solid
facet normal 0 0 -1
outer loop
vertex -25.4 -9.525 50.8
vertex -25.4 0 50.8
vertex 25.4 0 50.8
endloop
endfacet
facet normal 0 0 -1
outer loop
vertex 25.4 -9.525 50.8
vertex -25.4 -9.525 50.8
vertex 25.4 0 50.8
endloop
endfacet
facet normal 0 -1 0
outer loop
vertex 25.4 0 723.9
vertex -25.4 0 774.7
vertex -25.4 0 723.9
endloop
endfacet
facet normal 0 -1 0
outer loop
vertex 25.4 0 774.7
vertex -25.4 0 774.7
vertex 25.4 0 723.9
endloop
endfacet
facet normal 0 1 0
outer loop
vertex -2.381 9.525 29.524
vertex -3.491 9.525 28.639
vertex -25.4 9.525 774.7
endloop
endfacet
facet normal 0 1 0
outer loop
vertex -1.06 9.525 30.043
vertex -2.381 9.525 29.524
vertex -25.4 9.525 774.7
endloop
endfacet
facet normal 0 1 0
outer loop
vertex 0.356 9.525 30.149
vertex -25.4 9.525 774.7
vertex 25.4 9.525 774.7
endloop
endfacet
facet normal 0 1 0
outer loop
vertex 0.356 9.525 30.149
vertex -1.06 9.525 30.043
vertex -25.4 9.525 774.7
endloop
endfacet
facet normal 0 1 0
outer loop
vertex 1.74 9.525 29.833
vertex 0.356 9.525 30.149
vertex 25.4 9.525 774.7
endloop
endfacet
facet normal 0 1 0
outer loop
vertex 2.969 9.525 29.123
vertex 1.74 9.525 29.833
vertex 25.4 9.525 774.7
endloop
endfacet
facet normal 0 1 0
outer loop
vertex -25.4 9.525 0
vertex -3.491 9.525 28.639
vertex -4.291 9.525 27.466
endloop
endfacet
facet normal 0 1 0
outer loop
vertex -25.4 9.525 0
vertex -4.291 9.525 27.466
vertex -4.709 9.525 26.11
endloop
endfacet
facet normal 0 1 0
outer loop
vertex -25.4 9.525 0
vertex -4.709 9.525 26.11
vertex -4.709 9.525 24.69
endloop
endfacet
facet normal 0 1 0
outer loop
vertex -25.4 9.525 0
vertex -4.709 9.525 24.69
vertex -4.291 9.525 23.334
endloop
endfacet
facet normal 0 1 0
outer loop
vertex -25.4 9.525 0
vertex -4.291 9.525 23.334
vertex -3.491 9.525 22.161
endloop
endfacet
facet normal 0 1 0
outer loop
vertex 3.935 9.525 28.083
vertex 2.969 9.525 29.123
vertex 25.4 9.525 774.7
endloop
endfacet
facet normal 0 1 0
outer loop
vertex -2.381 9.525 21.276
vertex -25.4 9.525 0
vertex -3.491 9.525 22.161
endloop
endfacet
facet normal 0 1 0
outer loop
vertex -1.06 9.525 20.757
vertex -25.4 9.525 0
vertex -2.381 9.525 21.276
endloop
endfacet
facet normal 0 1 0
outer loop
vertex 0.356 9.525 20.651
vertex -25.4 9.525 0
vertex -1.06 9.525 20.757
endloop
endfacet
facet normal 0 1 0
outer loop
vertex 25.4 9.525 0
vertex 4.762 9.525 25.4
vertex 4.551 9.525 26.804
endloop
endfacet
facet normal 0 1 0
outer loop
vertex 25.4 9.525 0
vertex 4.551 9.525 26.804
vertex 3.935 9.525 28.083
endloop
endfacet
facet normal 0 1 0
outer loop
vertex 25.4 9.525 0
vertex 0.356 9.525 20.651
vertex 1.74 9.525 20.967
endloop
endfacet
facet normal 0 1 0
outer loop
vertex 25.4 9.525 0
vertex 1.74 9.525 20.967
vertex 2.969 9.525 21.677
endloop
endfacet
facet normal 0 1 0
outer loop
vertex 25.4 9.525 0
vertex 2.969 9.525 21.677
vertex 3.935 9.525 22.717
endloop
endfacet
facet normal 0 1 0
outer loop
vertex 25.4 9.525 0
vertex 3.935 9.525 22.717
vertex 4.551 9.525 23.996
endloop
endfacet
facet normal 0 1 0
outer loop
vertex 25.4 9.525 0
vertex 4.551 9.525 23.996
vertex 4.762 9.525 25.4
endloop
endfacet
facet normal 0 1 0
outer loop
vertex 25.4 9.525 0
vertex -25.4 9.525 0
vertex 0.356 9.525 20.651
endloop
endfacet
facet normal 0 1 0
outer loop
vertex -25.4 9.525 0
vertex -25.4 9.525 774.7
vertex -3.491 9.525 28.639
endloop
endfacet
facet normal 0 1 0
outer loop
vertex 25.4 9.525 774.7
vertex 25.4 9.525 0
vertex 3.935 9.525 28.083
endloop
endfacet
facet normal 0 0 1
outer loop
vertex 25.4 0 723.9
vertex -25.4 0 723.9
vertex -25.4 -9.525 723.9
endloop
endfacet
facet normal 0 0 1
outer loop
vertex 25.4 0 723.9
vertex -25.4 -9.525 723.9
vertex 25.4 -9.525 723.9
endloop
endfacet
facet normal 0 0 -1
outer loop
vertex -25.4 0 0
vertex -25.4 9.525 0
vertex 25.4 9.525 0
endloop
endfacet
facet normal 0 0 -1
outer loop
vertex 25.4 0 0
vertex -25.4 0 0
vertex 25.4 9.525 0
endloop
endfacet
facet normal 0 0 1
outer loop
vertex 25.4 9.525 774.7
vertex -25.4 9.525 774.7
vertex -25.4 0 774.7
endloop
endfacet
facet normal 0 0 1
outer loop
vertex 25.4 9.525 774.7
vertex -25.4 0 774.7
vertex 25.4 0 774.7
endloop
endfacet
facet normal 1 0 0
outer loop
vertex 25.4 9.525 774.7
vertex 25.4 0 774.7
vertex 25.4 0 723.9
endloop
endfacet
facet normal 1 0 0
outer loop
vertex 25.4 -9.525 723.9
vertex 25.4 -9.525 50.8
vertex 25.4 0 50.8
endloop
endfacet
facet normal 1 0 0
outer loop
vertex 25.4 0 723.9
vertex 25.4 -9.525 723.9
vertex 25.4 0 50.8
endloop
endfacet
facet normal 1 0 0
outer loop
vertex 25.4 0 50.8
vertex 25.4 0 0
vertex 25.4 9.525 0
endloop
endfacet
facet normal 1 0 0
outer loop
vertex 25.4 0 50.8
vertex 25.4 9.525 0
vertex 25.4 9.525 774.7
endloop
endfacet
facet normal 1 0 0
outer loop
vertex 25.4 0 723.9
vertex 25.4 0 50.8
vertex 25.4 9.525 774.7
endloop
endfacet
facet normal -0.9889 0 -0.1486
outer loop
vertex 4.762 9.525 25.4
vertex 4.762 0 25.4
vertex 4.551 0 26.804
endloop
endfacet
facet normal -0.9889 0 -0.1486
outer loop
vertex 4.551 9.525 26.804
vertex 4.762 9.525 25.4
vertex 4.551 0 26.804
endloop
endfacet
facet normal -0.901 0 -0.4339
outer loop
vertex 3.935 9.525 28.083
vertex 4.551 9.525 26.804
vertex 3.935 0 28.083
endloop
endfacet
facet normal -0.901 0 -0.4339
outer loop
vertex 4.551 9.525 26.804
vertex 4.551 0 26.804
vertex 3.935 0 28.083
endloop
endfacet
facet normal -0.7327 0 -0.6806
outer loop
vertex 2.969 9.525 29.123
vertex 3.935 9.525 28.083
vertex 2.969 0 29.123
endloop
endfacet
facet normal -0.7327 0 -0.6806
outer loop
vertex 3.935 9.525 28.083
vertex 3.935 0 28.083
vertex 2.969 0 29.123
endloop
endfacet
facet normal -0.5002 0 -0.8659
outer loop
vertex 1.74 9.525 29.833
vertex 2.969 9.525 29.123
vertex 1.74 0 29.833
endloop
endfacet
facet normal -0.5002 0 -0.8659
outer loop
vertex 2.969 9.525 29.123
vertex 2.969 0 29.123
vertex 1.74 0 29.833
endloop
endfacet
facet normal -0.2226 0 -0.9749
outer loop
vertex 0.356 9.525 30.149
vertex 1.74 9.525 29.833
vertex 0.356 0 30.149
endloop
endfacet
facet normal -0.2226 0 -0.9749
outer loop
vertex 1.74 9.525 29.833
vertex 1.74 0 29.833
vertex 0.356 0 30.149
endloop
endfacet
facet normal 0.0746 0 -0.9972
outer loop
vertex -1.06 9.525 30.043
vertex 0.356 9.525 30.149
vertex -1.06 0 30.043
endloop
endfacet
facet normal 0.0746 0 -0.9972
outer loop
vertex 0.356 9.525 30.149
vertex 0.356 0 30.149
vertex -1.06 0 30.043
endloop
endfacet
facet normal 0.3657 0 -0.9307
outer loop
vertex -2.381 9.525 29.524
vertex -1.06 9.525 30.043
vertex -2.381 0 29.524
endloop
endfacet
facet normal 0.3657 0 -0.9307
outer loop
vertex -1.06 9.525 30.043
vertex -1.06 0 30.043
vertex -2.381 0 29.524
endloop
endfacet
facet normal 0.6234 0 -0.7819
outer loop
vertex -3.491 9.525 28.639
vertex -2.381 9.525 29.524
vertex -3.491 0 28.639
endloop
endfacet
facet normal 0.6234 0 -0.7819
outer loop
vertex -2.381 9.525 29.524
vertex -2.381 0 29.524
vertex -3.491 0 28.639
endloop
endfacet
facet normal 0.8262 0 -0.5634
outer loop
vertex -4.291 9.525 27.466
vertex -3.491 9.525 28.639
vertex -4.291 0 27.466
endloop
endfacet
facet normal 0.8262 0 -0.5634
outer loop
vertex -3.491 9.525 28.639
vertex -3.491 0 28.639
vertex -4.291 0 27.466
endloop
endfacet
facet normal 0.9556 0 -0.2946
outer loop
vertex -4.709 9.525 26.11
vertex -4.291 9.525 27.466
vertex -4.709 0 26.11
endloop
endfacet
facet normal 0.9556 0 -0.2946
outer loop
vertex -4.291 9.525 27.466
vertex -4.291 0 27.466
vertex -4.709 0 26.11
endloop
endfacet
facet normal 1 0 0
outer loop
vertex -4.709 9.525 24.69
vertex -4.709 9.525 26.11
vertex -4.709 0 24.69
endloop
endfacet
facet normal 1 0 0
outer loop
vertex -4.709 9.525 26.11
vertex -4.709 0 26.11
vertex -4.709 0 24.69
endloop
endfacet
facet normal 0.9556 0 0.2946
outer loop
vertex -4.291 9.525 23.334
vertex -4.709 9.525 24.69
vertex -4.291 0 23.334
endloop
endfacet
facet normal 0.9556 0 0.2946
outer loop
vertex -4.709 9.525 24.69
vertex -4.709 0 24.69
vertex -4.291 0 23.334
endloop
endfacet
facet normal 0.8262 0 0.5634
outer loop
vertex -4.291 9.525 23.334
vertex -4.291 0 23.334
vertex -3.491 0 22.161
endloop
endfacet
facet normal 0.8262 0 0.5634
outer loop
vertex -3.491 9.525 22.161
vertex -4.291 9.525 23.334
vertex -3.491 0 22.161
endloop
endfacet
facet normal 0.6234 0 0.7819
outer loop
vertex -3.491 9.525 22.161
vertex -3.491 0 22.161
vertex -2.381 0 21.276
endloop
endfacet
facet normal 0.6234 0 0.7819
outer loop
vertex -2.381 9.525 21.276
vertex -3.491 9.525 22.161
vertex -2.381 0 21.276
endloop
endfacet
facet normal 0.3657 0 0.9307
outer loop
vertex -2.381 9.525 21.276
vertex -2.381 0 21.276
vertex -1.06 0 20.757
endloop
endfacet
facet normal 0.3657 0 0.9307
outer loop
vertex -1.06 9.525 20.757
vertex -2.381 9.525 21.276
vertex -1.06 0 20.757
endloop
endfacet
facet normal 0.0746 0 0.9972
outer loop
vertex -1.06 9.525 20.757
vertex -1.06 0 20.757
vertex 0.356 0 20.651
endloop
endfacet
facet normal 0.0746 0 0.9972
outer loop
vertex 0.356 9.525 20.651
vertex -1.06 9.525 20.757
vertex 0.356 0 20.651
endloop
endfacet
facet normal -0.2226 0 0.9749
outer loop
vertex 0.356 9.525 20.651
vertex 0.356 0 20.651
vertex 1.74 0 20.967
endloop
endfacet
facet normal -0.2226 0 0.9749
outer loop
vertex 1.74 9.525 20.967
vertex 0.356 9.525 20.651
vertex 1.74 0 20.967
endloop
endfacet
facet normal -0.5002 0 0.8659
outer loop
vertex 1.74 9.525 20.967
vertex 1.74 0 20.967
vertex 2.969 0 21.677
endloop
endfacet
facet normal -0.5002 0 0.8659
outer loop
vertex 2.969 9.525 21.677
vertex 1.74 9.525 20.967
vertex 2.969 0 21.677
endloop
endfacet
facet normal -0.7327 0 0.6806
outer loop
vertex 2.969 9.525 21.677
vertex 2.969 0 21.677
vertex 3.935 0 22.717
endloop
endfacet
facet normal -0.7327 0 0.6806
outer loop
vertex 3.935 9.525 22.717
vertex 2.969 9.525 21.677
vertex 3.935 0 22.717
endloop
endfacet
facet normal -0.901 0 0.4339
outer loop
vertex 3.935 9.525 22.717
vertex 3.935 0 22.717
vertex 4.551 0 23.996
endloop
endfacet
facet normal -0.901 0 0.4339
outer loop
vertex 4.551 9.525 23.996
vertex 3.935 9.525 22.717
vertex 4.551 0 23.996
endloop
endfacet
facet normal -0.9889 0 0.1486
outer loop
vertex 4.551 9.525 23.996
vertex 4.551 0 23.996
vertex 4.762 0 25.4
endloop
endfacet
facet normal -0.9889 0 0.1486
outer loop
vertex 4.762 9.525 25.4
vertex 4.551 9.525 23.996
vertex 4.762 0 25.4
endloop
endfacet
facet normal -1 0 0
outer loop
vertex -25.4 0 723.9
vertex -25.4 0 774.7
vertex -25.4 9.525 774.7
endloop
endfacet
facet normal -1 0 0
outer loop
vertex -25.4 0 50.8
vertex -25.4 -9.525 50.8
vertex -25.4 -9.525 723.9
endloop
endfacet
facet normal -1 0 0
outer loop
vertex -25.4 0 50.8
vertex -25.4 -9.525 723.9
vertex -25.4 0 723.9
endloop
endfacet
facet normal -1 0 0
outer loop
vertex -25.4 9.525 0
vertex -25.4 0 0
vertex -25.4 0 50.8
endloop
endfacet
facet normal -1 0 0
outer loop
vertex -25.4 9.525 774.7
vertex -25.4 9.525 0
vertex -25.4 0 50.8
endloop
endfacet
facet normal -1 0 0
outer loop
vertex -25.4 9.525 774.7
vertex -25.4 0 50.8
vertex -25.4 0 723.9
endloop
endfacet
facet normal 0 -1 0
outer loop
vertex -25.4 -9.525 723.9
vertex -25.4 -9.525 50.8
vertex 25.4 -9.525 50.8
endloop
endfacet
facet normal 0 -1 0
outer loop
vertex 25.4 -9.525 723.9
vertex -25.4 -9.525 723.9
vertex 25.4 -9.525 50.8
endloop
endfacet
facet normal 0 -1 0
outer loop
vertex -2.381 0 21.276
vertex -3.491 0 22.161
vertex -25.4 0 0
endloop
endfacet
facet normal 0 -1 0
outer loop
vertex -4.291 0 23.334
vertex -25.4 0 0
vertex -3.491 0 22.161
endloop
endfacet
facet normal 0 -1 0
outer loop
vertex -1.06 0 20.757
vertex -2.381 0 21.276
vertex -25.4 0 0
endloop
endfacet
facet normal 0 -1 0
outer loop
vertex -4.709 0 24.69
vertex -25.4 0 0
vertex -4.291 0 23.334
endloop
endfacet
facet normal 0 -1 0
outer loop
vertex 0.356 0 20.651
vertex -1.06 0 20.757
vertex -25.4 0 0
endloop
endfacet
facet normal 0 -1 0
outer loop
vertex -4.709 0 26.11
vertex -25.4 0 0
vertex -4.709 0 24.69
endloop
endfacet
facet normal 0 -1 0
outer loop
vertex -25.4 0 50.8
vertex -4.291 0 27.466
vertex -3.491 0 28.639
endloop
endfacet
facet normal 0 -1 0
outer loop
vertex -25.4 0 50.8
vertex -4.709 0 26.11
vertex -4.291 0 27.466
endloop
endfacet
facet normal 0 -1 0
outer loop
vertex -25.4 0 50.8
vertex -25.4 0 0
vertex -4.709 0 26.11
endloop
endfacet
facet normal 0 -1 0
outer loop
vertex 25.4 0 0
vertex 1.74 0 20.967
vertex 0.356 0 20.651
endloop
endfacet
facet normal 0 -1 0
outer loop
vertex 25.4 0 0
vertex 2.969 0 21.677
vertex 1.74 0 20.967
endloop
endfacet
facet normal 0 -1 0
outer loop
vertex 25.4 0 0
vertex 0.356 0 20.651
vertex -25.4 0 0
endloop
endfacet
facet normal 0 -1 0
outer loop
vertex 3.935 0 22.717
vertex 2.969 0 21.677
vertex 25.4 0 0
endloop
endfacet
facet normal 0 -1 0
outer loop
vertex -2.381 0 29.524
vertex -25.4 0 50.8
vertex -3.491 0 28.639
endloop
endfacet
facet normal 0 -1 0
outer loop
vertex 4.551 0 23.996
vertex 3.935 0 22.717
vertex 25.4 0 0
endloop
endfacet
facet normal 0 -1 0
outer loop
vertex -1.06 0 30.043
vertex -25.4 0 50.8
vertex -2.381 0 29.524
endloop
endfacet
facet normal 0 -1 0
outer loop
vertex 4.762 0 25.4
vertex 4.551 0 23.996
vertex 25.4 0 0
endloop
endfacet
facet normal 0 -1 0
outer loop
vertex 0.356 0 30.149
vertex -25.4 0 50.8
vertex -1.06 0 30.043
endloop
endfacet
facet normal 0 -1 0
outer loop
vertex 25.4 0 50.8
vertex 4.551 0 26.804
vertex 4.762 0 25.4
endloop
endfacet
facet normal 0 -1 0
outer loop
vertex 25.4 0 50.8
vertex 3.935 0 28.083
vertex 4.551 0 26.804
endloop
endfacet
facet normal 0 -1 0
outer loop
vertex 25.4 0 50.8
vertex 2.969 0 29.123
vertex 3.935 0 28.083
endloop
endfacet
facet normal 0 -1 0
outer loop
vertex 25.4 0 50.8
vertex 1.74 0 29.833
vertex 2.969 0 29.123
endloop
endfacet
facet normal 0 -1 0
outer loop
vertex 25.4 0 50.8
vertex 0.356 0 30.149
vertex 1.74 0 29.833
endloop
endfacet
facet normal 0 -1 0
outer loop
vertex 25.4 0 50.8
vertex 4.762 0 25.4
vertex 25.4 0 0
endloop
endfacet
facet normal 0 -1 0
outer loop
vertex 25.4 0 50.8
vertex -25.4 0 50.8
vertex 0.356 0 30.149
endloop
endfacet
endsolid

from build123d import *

# Parameters (mm, degrees)
F0_W     = 50.8
F0_H     = 19.05
F1_DEPTH = 774.7
F2_W     = 122.43557321
F2_H     = 50.8
F2_W_2   = 343.1604206562
F3_DEPTH = 25.4
F4_R     = 4.7625
F5_DEPTH = 25.4


# Not quite as in the source:
# - a feature names something its author has since deleted; it is built from what else it names


with BuildPart() as f1:
    # F0 (on Top) → F1 (new body)
    with BuildSketch(Plane.XY):
        Rectangle(F0_W, F0_H)
    extrude(amount=F1_DEPTH)

    # F2 (on Front) → F3 (cut)
    with BuildSketch(Plane.XZ):
        with Locations((22.4465244144, 25.4)):
            Rectangle(F2_W, F2_H)
        with Locations((-38.7818217278, 749.3)):
            Rectangle(F2_W_2, F2_H)
    extrude(amount=F3_DEPTH, mode=Mode.SUBTRACT)

    # F4 (on Front) → F5 (cut)
    with BuildSketch(Plane.XZ):
        with Locations((0, 25.4)):
            Circle(F4_R)
    extrude(amount=-F5_DEPTH, mode=Mode.SUBTRACT)


solid = f1.part
